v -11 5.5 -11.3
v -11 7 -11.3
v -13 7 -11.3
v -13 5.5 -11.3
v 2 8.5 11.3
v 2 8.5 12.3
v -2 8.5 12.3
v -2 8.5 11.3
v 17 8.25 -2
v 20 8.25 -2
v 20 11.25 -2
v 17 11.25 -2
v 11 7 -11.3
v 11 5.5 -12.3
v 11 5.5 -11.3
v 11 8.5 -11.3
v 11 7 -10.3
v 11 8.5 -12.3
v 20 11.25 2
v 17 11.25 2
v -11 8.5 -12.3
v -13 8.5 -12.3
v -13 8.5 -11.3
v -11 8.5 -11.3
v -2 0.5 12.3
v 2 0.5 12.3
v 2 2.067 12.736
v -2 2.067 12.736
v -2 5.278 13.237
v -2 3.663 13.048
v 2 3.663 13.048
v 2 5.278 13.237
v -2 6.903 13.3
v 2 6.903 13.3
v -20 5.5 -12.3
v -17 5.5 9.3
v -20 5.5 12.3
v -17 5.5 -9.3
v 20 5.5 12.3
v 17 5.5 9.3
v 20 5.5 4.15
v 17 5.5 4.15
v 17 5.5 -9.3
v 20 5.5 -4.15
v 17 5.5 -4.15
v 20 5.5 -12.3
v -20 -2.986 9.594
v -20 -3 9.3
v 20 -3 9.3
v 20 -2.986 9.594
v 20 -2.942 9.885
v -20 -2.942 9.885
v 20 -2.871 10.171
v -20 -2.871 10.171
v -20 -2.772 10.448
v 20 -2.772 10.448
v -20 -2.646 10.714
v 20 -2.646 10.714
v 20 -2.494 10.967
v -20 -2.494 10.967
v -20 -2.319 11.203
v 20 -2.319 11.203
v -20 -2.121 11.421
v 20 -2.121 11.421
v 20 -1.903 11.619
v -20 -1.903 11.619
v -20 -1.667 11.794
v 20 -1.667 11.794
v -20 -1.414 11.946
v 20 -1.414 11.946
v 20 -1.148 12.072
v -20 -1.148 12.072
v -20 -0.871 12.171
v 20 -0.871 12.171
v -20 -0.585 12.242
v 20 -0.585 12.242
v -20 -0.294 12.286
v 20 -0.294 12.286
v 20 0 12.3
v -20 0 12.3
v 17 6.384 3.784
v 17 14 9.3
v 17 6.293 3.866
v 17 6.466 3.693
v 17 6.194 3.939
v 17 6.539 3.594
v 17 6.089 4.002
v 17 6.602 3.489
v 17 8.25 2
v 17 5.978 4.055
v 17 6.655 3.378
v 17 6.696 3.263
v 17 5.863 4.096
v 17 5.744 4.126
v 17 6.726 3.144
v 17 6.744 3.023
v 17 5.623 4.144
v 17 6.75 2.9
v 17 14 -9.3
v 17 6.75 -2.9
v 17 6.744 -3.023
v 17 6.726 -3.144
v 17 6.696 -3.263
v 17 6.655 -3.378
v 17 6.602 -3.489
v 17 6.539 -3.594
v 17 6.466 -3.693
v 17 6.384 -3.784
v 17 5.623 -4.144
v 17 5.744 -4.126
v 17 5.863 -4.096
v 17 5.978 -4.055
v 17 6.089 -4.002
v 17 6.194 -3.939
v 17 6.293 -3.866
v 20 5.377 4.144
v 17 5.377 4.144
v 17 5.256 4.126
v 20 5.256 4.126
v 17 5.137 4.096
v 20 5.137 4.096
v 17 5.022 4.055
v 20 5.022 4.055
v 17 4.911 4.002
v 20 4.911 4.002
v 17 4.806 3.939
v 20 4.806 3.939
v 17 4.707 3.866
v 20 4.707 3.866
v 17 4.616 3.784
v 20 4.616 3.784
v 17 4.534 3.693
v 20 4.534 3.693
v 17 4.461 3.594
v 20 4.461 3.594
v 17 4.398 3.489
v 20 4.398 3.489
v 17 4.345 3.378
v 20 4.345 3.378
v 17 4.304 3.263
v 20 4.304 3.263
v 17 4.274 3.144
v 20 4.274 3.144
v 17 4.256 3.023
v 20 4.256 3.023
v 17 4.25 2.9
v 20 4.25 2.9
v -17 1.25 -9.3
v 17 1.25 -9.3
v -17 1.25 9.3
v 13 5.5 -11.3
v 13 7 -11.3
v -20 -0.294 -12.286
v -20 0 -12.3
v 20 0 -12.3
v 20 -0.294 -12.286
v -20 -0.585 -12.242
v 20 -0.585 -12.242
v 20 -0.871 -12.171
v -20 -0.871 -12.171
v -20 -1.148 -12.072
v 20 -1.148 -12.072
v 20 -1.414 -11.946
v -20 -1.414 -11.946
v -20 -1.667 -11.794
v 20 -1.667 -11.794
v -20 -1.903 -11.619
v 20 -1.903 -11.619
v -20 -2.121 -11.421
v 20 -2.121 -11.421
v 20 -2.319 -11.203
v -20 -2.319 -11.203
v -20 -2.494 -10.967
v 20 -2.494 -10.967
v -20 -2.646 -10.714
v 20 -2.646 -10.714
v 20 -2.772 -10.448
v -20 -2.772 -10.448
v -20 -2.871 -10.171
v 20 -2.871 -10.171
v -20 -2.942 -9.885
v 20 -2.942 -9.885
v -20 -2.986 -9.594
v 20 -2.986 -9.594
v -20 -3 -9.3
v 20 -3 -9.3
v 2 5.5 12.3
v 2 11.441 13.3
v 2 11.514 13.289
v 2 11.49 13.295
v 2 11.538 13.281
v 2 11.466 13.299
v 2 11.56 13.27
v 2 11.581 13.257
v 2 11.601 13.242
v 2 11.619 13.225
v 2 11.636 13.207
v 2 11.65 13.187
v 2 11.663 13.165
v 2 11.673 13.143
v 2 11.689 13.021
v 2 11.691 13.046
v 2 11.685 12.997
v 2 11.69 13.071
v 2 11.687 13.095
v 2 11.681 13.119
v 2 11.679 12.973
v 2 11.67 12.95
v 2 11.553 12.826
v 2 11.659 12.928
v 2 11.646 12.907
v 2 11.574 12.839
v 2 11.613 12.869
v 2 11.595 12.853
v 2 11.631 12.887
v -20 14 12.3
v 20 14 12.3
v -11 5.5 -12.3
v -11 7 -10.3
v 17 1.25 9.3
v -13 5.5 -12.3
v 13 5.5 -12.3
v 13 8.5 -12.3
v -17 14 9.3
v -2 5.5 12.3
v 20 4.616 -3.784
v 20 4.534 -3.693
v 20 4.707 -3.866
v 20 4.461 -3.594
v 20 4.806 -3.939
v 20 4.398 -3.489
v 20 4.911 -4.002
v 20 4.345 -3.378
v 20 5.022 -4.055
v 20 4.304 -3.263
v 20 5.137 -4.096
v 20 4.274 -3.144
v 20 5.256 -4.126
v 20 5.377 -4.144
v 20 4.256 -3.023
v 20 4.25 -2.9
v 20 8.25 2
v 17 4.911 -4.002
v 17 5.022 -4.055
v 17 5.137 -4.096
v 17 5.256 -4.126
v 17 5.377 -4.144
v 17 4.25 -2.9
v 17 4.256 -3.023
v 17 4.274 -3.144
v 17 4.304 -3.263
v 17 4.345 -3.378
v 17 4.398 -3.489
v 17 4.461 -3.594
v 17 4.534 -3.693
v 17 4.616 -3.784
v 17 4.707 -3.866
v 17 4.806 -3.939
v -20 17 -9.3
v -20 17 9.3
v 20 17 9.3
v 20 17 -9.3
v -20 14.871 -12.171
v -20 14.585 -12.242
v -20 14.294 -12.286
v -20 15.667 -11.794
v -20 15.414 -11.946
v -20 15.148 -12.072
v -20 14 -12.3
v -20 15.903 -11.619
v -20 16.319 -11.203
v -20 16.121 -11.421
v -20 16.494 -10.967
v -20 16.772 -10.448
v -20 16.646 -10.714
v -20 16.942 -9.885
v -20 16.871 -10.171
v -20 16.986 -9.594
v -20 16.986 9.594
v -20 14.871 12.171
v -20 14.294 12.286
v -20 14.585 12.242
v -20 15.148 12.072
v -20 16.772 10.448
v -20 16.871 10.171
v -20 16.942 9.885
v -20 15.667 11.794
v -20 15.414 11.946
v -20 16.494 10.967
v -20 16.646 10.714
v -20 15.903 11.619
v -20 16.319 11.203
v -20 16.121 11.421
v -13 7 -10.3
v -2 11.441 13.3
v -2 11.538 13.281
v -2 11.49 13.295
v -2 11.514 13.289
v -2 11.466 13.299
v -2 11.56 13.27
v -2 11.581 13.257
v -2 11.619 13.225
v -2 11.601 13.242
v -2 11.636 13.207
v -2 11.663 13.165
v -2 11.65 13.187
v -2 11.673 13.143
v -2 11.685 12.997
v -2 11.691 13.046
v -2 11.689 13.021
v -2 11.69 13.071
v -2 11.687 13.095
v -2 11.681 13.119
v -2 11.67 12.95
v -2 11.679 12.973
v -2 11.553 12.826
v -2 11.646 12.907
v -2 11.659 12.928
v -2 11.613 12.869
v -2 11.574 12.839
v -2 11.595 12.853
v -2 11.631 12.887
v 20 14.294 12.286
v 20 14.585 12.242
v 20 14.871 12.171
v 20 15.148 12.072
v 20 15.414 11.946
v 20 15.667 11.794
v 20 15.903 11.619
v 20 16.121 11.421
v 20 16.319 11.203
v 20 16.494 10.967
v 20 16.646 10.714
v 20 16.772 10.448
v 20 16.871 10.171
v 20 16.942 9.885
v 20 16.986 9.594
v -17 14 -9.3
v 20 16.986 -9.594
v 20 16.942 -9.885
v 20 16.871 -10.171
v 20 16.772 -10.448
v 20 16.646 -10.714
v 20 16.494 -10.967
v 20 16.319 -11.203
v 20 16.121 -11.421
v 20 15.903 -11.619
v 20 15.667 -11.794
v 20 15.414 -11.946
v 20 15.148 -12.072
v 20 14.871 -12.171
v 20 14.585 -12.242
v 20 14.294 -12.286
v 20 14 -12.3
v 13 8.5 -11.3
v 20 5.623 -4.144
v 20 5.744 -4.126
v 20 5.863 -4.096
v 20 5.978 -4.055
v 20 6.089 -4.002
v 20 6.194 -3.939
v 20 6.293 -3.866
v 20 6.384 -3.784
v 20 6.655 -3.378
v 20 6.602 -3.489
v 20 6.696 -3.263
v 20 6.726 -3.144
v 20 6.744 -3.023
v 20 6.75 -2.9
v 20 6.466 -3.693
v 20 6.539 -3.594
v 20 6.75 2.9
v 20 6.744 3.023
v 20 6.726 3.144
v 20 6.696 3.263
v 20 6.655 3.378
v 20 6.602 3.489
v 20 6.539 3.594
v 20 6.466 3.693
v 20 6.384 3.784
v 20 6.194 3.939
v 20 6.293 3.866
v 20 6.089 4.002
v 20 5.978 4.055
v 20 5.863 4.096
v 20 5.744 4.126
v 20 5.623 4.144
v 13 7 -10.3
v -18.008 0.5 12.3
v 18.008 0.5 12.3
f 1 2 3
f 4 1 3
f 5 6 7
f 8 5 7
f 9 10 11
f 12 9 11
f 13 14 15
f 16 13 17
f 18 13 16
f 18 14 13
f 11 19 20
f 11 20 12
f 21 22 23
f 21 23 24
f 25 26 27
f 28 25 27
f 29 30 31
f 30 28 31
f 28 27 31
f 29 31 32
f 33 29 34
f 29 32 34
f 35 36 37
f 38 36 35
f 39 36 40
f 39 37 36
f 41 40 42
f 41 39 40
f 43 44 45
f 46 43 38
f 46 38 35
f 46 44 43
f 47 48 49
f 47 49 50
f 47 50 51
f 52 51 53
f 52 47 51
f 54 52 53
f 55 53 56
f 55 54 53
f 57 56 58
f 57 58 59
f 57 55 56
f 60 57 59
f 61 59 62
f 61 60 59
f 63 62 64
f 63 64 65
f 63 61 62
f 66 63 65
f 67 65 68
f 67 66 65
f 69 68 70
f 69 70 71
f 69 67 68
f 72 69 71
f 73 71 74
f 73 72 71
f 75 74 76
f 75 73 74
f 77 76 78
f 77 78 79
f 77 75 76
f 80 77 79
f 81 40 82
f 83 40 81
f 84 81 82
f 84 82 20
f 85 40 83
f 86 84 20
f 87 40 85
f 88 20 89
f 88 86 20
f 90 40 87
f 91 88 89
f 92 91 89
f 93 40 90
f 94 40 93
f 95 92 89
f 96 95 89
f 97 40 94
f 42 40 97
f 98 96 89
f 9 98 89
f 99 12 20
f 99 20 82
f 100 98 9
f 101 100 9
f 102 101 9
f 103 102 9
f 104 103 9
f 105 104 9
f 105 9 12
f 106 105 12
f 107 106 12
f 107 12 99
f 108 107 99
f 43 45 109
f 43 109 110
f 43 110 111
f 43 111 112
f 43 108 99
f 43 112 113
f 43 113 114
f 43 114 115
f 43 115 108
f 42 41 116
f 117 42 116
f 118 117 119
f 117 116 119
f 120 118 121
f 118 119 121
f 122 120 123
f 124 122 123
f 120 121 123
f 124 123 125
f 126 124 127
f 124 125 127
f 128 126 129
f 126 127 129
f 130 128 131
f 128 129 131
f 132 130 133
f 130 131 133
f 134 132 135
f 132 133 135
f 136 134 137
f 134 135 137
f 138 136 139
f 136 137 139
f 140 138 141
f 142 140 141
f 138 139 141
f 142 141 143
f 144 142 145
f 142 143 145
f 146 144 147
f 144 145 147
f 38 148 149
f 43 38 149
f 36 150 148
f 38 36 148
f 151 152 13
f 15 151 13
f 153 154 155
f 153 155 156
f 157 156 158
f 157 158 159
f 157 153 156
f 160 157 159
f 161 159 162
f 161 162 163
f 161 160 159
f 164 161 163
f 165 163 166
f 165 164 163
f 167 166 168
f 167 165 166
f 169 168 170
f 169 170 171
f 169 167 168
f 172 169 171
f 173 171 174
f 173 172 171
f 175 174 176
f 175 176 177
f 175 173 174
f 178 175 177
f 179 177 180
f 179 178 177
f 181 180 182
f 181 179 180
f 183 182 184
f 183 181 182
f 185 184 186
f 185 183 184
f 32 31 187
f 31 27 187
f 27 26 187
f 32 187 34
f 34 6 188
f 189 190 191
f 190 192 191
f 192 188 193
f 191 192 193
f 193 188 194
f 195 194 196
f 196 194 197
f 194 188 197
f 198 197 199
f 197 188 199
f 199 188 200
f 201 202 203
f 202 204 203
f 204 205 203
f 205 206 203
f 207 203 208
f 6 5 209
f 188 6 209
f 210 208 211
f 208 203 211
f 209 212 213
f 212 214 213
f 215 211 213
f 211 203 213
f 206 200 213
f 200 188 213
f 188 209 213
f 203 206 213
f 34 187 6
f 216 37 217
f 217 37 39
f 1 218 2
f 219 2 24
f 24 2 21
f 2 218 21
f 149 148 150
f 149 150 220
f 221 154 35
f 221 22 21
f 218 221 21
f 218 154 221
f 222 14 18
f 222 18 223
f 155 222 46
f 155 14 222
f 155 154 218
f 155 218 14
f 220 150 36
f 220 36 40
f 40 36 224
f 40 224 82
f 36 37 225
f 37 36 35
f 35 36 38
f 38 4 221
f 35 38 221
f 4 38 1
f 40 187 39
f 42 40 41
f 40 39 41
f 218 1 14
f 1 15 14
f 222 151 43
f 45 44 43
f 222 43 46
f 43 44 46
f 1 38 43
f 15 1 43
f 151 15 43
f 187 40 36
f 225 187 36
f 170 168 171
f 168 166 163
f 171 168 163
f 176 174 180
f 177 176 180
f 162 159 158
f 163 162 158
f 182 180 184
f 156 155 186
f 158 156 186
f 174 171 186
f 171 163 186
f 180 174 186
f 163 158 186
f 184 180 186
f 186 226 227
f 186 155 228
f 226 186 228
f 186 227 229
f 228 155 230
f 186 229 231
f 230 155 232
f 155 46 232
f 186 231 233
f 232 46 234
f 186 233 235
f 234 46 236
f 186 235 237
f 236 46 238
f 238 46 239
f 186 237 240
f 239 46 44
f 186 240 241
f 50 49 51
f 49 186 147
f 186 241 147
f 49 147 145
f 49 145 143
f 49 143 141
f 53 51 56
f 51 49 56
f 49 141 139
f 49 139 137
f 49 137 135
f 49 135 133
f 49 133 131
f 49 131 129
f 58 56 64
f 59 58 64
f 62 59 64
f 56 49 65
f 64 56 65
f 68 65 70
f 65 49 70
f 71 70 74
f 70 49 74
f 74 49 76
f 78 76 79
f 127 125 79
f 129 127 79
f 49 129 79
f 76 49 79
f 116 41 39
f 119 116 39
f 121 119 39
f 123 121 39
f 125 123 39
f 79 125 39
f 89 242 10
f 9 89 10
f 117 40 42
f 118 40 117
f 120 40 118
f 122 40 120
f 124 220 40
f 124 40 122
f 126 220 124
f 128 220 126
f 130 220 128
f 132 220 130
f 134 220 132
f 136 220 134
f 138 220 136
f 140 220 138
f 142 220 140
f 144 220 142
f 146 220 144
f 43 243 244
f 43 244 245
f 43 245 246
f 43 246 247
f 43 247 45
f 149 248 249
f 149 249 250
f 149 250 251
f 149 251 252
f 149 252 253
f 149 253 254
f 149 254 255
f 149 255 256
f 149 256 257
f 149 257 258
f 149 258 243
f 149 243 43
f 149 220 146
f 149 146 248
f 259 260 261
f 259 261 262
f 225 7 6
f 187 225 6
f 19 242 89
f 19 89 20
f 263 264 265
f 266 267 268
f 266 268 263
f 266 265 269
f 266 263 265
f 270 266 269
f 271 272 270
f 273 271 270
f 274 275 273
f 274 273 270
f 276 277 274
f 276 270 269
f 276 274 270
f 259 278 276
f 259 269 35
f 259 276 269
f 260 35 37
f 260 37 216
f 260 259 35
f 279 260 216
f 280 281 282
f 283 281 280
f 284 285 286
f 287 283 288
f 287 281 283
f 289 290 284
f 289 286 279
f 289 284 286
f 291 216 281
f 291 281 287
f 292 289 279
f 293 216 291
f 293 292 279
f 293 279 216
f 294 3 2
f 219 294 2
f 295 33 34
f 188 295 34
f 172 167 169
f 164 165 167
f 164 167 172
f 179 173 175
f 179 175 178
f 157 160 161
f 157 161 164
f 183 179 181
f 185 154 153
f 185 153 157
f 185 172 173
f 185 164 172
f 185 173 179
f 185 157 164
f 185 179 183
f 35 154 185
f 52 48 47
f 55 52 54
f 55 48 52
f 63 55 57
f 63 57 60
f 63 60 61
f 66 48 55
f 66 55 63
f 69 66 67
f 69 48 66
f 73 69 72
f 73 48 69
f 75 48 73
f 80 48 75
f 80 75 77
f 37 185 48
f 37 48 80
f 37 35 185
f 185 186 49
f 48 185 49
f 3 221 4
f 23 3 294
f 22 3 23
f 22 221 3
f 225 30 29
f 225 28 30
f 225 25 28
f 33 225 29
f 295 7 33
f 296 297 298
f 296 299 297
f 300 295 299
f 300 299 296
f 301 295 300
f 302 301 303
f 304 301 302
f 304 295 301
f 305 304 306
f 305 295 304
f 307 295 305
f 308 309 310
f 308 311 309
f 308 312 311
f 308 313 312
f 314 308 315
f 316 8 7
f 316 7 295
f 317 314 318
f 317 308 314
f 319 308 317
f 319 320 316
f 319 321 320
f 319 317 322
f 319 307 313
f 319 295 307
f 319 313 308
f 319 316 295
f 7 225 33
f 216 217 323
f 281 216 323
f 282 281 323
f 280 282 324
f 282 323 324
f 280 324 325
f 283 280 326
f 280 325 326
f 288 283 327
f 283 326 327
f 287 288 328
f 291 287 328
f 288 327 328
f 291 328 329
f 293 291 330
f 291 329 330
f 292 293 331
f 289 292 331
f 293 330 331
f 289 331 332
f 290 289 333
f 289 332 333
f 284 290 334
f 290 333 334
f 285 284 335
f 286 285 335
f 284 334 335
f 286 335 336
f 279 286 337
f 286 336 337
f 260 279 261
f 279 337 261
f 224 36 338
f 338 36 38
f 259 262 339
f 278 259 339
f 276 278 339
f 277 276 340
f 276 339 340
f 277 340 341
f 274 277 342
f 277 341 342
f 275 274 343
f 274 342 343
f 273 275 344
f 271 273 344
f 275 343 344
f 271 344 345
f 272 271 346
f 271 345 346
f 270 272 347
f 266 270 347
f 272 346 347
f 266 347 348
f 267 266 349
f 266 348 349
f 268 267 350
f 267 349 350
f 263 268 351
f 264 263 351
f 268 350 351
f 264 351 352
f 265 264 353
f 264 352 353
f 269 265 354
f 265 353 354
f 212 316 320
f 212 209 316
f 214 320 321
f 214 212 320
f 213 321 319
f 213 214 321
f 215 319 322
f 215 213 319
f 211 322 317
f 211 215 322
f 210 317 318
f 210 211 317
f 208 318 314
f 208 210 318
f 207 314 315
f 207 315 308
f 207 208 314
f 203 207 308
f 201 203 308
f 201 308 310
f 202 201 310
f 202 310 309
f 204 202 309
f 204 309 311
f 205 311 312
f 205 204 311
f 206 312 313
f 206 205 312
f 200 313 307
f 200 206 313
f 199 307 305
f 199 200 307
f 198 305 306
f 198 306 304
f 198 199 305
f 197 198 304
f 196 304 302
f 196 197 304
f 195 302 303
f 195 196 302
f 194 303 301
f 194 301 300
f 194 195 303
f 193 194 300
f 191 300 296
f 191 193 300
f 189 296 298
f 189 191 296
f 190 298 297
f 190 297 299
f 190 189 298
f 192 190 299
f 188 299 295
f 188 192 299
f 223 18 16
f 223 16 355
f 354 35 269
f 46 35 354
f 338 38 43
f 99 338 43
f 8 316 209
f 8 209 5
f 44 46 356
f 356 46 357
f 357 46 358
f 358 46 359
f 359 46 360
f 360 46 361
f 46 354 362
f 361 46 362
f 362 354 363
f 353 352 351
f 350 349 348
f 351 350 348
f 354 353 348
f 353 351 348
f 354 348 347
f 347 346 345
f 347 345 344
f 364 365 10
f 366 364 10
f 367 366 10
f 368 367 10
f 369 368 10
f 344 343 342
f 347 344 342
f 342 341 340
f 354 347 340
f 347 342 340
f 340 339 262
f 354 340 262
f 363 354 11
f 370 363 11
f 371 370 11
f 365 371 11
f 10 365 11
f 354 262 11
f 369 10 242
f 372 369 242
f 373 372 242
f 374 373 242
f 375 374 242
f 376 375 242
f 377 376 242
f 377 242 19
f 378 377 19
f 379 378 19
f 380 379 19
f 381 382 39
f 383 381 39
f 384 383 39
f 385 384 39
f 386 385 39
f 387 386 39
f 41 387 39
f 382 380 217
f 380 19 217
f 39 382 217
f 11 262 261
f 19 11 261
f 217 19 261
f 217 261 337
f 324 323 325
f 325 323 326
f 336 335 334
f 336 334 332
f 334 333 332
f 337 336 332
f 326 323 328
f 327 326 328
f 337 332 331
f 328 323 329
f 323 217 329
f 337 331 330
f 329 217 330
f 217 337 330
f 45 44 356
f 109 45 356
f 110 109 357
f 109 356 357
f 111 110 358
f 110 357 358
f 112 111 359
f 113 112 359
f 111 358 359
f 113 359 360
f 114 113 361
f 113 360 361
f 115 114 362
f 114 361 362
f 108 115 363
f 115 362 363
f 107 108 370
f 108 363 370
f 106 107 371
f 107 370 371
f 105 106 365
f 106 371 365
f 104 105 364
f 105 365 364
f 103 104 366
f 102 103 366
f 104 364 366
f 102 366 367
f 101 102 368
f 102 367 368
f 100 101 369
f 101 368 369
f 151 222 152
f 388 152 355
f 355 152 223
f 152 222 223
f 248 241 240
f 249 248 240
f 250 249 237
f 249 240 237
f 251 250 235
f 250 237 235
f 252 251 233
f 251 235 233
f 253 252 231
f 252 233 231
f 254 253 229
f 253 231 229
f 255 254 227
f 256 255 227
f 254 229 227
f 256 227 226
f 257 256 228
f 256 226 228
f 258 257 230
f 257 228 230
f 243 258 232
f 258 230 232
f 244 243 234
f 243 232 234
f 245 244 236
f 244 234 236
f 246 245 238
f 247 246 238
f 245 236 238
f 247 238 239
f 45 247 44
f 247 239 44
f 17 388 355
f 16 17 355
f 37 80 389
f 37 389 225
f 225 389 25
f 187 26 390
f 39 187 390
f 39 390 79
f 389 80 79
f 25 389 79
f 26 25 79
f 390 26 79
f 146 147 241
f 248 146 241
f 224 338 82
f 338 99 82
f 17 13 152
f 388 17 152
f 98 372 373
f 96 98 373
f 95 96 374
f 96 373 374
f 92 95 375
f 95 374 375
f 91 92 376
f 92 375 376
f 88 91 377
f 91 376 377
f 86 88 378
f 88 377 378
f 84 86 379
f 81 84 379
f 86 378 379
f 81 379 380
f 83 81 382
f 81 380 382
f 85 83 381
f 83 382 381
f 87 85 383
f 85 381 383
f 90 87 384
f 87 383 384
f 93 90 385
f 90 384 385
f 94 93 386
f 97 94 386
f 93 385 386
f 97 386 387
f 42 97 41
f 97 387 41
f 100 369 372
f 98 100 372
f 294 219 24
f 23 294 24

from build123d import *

# Parameters (mm, degrees)
SKETCH1_W            = 40
SKETCH1_H            = 24.6
SKETCH1_W_2          = 34
SKETCH1_H_2          = 18.6
BOSS_EXTRUDE1_DEPTH  = 14
CUT_EXTRUDE1_DEPTH   = 10
SKETCH5_W            = 4
SKETCH5_H            = 3
CUT_EXTRUDE2_DEPTH   = 10
BOSS_EXTRUDE2_DEPTH  = 40
BOSS_EXTRUDE3_DEPTH  = 40
SKETCH8_W            = 4
SKETCH8_H            = 12
BOSS_EXTRUDE4_DEPTH  = 1
FILLET4_R            = 21
SKETCH10_W           = 4
SKETCH10_H           = 2
BOSS_EXTRUDE6_DEPTH  = 1
SKETCH13_W           = 2
SKETCH13_H           = 3
BOSS_EXTRUDE7_DEPTH  = 1
SKETCH14_W           = 2
SKETCH14_H           = 1.5
BOSS_EXTRUDE9_DEPTH  = 1
SKETCH14_4_W         = 2
SKETCH14_4_H         = 1.5
BOSS_EXTRUDE10_DEPTH = 1
CUT_EXTRUDE5_DEPTH   = 28
CUT_EXTRUDE6_DEPTH   = 28
FILLET7_R            = 0.25
SKETCH18_W           = 34
SKETCH18_H           = 18.6
BOSS_EXTRUDE11_DEPTH = 1.25
CUT_EXTRUDE7_DEPTH   = 5.25


with BuildPart() as part:
    # Sketch1 → Boss-Extrude1 (new body)
    with BuildSketch(Plane(origin=(0, 0, 0), x_dir=(1, 0, 0), z_dir=(0, 1, 0))):
        Rectangle(SKETCH1_W, SKETCH1_H)
        Rectangle(SKETCH1_W_2, SKETCH1_H_2, mode=Mode.SUBTRACT)
    extrude(amount=BOSS_EXTRUDE1_DEPTH)

    # Sketch3 → Cut-Extrude1 (cut)
    with BuildSketch(Plane(origin=(20, 0, 0), x_dir=(0, 0, -1), z_dir=(1, 0, 0))):
        with BuildLine():
            ThreePointArc((2.9, 4.25), (4.15, 5.5), (2.9, 6.75))
            Line((2.9, 6.75), (-2.9, 6.75))
            ThreePointArc((-2.9, 6.75), (-4.15, 5.5), (-2.9, 4.25))
            Line((-2.9, 4.25), (2.9, 4.25))
        make_face()
    extrude(amount=-CUT_EXTRUDE1_DEPTH, mode=Mode.SUBTRACT)


with BuildPart() as body_2:
    # Split1: the piece on the far side of the plane
    add(part.part)
    split(bisect_by=Plane(origin=(0, 5.5, 0), x_dir=(0, 0, -1), z_dir=(0, -1, 0)), keep=Keep.BOTTOM)

    # Sketch5 → Cut-Extrude2 (cut)
    with BuildSketch(Plane(origin=(20, 0, 0), x_dir=(0, 0, -1), z_dir=(1, 0, 0))):
        with Locations((0, 9.75)):
            Rectangle(SKETCH5_W, SKETCH5_H)
    extrude(amount=-CUT_EXTRUDE2_DEPTH, mode=Mode.SUBTRACT)

    # Sketch6 → Boss-Extrude2 (add)
    with BuildSketch(Plane(origin=(20, 0, 0), x_dir=(0, 0, -1), z_dir=(1, 0, 0))):
        with BuildLine():
            Line((-9.3, 17), (9.3, 17))
            ThreePointArc((9.3, 17), (11.421320344, 16.121320344), (12.3, 14))
            Line((12.3, 14), (-12.3, 14))
            ThreePointArc((-12.3, 14), (-11.421320344, 16.121320344), (-9.3, 17))
        make_face()
    extrude(amount=-BOSS_EXTRUDE2_DEPTH)


with BuildPart() as part_1:
    add(part.part)

    # Split1
    split(bisect_by=Plane(origin=(0, 5.5, 0), x_dir=(0, 0, -1), z_dir=(0, -1, 0)), keep=Keep.TOP)

    # Sketch7 → Boss-Extrude3 (add)
    with BuildSketch(Plane.ZY.offset(20)):
        with BuildLine():
            Line((-9.3, -3), (9.3, -3))
            ThreePointArc((9.3, -3), (11.421320344, -2.121320344), (12.3, 0))
            Line((12.3, 0), (-12.3, 0))
            ThreePointArc((-12.3, 0), (-11.421320344, -2.121320344), (-9.3, -3))
        make_face()
    extrude(amount=-BOSS_EXTRUDE3_DEPTH)

    # Sketch8 → Boss-Extrude4 (add)
    with BuildSketch(Plane.XY.offset(12.3)):
        with Locations((0, 6.5)):
            Rectangle(SKETCH8_W, SKETCH8_H)
    extrude(amount=BOSS_EXTRUDE4_DEPTH)

    # Fillet4
    # the kernel refuses this fillet: 21 mm, written as the material it takes off along each edge
    with BuildSketch(Plane(origin=(18.007810594, 0.5, 13.3), x_dir=(0, 0, -1), z_dir=(-1, 0, 0))) as fillet4_piece_1:
        with BuildLine():
            CenterArc((21, -6.403124237), FILLET4_R, 162.247209838, 17.752790162)
            Line((0, -6.403124237), (-0.42, -6.403124237))
            Line((-0.42, -6.403124237), (-0.42, 0))
            Line((-0.42, 0), (0, 0.42))
            ThreePointArc((0, 0.42), (0.5, 0.42), (0.6, 0.128062485))
            Line((0.6, 0.128062485), (1, 0))
        make_face()
    extrude(amount=36.015621187, mode=Mode.SUBTRACT)

    # Sketch10 → Boss-Extrude6 (add)
    with BuildSketch(Plane(origin=(0, 0, 12.3), x_dir=(-1, 0, 0), z_dir=(0, 0, -1))):
        with Locations((0, 9.5)):
            Rectangle(SKETCH10_W, SKETCH10_H)
    extrude(amount=BOSS_EXTRUDE6_DEPTH)

    # Sketch13 → Boss-Extrude7 (add)
    with BuildSketch(Plane(origin=(0, 0, -12.3), x_dir=(-1, 0, 0), z_dir=(0, 0, -1))):
        with Locations((-12, 7)):
            Rectangle(SKETCH13_W, SKETCH13_H)
        with Locations((12, 7)):
            Rectangle(SKETCH13_W, SKETCH13_H)
    extrude(amount=-BOSS_EXTRUDE7_DEPTH)

    # Sketch14 → Boss-Extrude9 (add)
    with BuildSketch(Plane.XY.offset(-11.3)):
        with Locations((12, 7.75)):
            Rectangle(SKETCH14_W, SKETCH14_H)
    extrude(amount=BOSS_EXTRUDE9_DEPTH)

    # Sketch14<4> → Boss-Extrude10 (add)
    with BuildSketch(Plane.XY.offset(-11.3)):
        with Locations((-12, 7.75)):
            Rectangle(SKETCH14_4_W, SKETCH14_4_H)
        with Locations((12, 7.75)):
            Rectangle(SKETCH14_4_W, SKETCH14_4_H)
    extrude(amount=BOSS_EXTRUDE10_DEPTH)

    # Sketch15 → Cut-Extrude5 (cut)
    with BuildSketch(Plane(origin=(13, 0, 0), x_dir=(0, 0, -1), z_dir=(1, 0, 0))):
        Polygon((10.3, 7), (11.3, 8.5), (10.3, 8.5), align=None)
    extrude(amount=-CUT_EXTRUDE5_DEPTH, mode=Mode.SUBTRACT)

    # Sketch16 → Cut-Extrude6 (cut)
    with BuildSketch(Plane(origin=(2, 0, 0), x_dir=(0, 0, -1), z_dir=(1, 0, 0))):
        Polygon((-13.3, 12.5), (-12.3, 10.5), (-12.3, 12.5), align=None)
    extrude(amount=-CUT_EXTRUDE6_DEPTH, mode=Mode.SUBTRACT)

    # Fillet7
    fillet7_edges = [part_1.edges().sort_by_distance(p)[0] for p in [
        (0, 12.5, 13.3),
    ]]
    fillet(fillet7_edges, radius=FILLET7_R)

    # Sketch18 → Boss-Extrude11 (add)
    with BuildSketch(Plane(origin=(0, 0, 0), x_dir=(1, 0, 0), z_dir=(0, 1, 0))):
        Rectangle(SKETCH18_W, SKETCH18_H)
    extrude(amount=BOSS_EXTRUDE11_DEPTH)

    # Sketch19 → Cut-Extrude7 (cut)
    with BuildSketch(Plane.ZY.offset(2)):
        Polygon((12.3, 10.5), (11.3, 8.5), (11.3, 10.5), align=None)
    extrude(amount=-CUT_EXTRUDE7_DEPTH, mode=Mode.SUBTRACT)


solid = Compound([body_2.part, part_1.part])
